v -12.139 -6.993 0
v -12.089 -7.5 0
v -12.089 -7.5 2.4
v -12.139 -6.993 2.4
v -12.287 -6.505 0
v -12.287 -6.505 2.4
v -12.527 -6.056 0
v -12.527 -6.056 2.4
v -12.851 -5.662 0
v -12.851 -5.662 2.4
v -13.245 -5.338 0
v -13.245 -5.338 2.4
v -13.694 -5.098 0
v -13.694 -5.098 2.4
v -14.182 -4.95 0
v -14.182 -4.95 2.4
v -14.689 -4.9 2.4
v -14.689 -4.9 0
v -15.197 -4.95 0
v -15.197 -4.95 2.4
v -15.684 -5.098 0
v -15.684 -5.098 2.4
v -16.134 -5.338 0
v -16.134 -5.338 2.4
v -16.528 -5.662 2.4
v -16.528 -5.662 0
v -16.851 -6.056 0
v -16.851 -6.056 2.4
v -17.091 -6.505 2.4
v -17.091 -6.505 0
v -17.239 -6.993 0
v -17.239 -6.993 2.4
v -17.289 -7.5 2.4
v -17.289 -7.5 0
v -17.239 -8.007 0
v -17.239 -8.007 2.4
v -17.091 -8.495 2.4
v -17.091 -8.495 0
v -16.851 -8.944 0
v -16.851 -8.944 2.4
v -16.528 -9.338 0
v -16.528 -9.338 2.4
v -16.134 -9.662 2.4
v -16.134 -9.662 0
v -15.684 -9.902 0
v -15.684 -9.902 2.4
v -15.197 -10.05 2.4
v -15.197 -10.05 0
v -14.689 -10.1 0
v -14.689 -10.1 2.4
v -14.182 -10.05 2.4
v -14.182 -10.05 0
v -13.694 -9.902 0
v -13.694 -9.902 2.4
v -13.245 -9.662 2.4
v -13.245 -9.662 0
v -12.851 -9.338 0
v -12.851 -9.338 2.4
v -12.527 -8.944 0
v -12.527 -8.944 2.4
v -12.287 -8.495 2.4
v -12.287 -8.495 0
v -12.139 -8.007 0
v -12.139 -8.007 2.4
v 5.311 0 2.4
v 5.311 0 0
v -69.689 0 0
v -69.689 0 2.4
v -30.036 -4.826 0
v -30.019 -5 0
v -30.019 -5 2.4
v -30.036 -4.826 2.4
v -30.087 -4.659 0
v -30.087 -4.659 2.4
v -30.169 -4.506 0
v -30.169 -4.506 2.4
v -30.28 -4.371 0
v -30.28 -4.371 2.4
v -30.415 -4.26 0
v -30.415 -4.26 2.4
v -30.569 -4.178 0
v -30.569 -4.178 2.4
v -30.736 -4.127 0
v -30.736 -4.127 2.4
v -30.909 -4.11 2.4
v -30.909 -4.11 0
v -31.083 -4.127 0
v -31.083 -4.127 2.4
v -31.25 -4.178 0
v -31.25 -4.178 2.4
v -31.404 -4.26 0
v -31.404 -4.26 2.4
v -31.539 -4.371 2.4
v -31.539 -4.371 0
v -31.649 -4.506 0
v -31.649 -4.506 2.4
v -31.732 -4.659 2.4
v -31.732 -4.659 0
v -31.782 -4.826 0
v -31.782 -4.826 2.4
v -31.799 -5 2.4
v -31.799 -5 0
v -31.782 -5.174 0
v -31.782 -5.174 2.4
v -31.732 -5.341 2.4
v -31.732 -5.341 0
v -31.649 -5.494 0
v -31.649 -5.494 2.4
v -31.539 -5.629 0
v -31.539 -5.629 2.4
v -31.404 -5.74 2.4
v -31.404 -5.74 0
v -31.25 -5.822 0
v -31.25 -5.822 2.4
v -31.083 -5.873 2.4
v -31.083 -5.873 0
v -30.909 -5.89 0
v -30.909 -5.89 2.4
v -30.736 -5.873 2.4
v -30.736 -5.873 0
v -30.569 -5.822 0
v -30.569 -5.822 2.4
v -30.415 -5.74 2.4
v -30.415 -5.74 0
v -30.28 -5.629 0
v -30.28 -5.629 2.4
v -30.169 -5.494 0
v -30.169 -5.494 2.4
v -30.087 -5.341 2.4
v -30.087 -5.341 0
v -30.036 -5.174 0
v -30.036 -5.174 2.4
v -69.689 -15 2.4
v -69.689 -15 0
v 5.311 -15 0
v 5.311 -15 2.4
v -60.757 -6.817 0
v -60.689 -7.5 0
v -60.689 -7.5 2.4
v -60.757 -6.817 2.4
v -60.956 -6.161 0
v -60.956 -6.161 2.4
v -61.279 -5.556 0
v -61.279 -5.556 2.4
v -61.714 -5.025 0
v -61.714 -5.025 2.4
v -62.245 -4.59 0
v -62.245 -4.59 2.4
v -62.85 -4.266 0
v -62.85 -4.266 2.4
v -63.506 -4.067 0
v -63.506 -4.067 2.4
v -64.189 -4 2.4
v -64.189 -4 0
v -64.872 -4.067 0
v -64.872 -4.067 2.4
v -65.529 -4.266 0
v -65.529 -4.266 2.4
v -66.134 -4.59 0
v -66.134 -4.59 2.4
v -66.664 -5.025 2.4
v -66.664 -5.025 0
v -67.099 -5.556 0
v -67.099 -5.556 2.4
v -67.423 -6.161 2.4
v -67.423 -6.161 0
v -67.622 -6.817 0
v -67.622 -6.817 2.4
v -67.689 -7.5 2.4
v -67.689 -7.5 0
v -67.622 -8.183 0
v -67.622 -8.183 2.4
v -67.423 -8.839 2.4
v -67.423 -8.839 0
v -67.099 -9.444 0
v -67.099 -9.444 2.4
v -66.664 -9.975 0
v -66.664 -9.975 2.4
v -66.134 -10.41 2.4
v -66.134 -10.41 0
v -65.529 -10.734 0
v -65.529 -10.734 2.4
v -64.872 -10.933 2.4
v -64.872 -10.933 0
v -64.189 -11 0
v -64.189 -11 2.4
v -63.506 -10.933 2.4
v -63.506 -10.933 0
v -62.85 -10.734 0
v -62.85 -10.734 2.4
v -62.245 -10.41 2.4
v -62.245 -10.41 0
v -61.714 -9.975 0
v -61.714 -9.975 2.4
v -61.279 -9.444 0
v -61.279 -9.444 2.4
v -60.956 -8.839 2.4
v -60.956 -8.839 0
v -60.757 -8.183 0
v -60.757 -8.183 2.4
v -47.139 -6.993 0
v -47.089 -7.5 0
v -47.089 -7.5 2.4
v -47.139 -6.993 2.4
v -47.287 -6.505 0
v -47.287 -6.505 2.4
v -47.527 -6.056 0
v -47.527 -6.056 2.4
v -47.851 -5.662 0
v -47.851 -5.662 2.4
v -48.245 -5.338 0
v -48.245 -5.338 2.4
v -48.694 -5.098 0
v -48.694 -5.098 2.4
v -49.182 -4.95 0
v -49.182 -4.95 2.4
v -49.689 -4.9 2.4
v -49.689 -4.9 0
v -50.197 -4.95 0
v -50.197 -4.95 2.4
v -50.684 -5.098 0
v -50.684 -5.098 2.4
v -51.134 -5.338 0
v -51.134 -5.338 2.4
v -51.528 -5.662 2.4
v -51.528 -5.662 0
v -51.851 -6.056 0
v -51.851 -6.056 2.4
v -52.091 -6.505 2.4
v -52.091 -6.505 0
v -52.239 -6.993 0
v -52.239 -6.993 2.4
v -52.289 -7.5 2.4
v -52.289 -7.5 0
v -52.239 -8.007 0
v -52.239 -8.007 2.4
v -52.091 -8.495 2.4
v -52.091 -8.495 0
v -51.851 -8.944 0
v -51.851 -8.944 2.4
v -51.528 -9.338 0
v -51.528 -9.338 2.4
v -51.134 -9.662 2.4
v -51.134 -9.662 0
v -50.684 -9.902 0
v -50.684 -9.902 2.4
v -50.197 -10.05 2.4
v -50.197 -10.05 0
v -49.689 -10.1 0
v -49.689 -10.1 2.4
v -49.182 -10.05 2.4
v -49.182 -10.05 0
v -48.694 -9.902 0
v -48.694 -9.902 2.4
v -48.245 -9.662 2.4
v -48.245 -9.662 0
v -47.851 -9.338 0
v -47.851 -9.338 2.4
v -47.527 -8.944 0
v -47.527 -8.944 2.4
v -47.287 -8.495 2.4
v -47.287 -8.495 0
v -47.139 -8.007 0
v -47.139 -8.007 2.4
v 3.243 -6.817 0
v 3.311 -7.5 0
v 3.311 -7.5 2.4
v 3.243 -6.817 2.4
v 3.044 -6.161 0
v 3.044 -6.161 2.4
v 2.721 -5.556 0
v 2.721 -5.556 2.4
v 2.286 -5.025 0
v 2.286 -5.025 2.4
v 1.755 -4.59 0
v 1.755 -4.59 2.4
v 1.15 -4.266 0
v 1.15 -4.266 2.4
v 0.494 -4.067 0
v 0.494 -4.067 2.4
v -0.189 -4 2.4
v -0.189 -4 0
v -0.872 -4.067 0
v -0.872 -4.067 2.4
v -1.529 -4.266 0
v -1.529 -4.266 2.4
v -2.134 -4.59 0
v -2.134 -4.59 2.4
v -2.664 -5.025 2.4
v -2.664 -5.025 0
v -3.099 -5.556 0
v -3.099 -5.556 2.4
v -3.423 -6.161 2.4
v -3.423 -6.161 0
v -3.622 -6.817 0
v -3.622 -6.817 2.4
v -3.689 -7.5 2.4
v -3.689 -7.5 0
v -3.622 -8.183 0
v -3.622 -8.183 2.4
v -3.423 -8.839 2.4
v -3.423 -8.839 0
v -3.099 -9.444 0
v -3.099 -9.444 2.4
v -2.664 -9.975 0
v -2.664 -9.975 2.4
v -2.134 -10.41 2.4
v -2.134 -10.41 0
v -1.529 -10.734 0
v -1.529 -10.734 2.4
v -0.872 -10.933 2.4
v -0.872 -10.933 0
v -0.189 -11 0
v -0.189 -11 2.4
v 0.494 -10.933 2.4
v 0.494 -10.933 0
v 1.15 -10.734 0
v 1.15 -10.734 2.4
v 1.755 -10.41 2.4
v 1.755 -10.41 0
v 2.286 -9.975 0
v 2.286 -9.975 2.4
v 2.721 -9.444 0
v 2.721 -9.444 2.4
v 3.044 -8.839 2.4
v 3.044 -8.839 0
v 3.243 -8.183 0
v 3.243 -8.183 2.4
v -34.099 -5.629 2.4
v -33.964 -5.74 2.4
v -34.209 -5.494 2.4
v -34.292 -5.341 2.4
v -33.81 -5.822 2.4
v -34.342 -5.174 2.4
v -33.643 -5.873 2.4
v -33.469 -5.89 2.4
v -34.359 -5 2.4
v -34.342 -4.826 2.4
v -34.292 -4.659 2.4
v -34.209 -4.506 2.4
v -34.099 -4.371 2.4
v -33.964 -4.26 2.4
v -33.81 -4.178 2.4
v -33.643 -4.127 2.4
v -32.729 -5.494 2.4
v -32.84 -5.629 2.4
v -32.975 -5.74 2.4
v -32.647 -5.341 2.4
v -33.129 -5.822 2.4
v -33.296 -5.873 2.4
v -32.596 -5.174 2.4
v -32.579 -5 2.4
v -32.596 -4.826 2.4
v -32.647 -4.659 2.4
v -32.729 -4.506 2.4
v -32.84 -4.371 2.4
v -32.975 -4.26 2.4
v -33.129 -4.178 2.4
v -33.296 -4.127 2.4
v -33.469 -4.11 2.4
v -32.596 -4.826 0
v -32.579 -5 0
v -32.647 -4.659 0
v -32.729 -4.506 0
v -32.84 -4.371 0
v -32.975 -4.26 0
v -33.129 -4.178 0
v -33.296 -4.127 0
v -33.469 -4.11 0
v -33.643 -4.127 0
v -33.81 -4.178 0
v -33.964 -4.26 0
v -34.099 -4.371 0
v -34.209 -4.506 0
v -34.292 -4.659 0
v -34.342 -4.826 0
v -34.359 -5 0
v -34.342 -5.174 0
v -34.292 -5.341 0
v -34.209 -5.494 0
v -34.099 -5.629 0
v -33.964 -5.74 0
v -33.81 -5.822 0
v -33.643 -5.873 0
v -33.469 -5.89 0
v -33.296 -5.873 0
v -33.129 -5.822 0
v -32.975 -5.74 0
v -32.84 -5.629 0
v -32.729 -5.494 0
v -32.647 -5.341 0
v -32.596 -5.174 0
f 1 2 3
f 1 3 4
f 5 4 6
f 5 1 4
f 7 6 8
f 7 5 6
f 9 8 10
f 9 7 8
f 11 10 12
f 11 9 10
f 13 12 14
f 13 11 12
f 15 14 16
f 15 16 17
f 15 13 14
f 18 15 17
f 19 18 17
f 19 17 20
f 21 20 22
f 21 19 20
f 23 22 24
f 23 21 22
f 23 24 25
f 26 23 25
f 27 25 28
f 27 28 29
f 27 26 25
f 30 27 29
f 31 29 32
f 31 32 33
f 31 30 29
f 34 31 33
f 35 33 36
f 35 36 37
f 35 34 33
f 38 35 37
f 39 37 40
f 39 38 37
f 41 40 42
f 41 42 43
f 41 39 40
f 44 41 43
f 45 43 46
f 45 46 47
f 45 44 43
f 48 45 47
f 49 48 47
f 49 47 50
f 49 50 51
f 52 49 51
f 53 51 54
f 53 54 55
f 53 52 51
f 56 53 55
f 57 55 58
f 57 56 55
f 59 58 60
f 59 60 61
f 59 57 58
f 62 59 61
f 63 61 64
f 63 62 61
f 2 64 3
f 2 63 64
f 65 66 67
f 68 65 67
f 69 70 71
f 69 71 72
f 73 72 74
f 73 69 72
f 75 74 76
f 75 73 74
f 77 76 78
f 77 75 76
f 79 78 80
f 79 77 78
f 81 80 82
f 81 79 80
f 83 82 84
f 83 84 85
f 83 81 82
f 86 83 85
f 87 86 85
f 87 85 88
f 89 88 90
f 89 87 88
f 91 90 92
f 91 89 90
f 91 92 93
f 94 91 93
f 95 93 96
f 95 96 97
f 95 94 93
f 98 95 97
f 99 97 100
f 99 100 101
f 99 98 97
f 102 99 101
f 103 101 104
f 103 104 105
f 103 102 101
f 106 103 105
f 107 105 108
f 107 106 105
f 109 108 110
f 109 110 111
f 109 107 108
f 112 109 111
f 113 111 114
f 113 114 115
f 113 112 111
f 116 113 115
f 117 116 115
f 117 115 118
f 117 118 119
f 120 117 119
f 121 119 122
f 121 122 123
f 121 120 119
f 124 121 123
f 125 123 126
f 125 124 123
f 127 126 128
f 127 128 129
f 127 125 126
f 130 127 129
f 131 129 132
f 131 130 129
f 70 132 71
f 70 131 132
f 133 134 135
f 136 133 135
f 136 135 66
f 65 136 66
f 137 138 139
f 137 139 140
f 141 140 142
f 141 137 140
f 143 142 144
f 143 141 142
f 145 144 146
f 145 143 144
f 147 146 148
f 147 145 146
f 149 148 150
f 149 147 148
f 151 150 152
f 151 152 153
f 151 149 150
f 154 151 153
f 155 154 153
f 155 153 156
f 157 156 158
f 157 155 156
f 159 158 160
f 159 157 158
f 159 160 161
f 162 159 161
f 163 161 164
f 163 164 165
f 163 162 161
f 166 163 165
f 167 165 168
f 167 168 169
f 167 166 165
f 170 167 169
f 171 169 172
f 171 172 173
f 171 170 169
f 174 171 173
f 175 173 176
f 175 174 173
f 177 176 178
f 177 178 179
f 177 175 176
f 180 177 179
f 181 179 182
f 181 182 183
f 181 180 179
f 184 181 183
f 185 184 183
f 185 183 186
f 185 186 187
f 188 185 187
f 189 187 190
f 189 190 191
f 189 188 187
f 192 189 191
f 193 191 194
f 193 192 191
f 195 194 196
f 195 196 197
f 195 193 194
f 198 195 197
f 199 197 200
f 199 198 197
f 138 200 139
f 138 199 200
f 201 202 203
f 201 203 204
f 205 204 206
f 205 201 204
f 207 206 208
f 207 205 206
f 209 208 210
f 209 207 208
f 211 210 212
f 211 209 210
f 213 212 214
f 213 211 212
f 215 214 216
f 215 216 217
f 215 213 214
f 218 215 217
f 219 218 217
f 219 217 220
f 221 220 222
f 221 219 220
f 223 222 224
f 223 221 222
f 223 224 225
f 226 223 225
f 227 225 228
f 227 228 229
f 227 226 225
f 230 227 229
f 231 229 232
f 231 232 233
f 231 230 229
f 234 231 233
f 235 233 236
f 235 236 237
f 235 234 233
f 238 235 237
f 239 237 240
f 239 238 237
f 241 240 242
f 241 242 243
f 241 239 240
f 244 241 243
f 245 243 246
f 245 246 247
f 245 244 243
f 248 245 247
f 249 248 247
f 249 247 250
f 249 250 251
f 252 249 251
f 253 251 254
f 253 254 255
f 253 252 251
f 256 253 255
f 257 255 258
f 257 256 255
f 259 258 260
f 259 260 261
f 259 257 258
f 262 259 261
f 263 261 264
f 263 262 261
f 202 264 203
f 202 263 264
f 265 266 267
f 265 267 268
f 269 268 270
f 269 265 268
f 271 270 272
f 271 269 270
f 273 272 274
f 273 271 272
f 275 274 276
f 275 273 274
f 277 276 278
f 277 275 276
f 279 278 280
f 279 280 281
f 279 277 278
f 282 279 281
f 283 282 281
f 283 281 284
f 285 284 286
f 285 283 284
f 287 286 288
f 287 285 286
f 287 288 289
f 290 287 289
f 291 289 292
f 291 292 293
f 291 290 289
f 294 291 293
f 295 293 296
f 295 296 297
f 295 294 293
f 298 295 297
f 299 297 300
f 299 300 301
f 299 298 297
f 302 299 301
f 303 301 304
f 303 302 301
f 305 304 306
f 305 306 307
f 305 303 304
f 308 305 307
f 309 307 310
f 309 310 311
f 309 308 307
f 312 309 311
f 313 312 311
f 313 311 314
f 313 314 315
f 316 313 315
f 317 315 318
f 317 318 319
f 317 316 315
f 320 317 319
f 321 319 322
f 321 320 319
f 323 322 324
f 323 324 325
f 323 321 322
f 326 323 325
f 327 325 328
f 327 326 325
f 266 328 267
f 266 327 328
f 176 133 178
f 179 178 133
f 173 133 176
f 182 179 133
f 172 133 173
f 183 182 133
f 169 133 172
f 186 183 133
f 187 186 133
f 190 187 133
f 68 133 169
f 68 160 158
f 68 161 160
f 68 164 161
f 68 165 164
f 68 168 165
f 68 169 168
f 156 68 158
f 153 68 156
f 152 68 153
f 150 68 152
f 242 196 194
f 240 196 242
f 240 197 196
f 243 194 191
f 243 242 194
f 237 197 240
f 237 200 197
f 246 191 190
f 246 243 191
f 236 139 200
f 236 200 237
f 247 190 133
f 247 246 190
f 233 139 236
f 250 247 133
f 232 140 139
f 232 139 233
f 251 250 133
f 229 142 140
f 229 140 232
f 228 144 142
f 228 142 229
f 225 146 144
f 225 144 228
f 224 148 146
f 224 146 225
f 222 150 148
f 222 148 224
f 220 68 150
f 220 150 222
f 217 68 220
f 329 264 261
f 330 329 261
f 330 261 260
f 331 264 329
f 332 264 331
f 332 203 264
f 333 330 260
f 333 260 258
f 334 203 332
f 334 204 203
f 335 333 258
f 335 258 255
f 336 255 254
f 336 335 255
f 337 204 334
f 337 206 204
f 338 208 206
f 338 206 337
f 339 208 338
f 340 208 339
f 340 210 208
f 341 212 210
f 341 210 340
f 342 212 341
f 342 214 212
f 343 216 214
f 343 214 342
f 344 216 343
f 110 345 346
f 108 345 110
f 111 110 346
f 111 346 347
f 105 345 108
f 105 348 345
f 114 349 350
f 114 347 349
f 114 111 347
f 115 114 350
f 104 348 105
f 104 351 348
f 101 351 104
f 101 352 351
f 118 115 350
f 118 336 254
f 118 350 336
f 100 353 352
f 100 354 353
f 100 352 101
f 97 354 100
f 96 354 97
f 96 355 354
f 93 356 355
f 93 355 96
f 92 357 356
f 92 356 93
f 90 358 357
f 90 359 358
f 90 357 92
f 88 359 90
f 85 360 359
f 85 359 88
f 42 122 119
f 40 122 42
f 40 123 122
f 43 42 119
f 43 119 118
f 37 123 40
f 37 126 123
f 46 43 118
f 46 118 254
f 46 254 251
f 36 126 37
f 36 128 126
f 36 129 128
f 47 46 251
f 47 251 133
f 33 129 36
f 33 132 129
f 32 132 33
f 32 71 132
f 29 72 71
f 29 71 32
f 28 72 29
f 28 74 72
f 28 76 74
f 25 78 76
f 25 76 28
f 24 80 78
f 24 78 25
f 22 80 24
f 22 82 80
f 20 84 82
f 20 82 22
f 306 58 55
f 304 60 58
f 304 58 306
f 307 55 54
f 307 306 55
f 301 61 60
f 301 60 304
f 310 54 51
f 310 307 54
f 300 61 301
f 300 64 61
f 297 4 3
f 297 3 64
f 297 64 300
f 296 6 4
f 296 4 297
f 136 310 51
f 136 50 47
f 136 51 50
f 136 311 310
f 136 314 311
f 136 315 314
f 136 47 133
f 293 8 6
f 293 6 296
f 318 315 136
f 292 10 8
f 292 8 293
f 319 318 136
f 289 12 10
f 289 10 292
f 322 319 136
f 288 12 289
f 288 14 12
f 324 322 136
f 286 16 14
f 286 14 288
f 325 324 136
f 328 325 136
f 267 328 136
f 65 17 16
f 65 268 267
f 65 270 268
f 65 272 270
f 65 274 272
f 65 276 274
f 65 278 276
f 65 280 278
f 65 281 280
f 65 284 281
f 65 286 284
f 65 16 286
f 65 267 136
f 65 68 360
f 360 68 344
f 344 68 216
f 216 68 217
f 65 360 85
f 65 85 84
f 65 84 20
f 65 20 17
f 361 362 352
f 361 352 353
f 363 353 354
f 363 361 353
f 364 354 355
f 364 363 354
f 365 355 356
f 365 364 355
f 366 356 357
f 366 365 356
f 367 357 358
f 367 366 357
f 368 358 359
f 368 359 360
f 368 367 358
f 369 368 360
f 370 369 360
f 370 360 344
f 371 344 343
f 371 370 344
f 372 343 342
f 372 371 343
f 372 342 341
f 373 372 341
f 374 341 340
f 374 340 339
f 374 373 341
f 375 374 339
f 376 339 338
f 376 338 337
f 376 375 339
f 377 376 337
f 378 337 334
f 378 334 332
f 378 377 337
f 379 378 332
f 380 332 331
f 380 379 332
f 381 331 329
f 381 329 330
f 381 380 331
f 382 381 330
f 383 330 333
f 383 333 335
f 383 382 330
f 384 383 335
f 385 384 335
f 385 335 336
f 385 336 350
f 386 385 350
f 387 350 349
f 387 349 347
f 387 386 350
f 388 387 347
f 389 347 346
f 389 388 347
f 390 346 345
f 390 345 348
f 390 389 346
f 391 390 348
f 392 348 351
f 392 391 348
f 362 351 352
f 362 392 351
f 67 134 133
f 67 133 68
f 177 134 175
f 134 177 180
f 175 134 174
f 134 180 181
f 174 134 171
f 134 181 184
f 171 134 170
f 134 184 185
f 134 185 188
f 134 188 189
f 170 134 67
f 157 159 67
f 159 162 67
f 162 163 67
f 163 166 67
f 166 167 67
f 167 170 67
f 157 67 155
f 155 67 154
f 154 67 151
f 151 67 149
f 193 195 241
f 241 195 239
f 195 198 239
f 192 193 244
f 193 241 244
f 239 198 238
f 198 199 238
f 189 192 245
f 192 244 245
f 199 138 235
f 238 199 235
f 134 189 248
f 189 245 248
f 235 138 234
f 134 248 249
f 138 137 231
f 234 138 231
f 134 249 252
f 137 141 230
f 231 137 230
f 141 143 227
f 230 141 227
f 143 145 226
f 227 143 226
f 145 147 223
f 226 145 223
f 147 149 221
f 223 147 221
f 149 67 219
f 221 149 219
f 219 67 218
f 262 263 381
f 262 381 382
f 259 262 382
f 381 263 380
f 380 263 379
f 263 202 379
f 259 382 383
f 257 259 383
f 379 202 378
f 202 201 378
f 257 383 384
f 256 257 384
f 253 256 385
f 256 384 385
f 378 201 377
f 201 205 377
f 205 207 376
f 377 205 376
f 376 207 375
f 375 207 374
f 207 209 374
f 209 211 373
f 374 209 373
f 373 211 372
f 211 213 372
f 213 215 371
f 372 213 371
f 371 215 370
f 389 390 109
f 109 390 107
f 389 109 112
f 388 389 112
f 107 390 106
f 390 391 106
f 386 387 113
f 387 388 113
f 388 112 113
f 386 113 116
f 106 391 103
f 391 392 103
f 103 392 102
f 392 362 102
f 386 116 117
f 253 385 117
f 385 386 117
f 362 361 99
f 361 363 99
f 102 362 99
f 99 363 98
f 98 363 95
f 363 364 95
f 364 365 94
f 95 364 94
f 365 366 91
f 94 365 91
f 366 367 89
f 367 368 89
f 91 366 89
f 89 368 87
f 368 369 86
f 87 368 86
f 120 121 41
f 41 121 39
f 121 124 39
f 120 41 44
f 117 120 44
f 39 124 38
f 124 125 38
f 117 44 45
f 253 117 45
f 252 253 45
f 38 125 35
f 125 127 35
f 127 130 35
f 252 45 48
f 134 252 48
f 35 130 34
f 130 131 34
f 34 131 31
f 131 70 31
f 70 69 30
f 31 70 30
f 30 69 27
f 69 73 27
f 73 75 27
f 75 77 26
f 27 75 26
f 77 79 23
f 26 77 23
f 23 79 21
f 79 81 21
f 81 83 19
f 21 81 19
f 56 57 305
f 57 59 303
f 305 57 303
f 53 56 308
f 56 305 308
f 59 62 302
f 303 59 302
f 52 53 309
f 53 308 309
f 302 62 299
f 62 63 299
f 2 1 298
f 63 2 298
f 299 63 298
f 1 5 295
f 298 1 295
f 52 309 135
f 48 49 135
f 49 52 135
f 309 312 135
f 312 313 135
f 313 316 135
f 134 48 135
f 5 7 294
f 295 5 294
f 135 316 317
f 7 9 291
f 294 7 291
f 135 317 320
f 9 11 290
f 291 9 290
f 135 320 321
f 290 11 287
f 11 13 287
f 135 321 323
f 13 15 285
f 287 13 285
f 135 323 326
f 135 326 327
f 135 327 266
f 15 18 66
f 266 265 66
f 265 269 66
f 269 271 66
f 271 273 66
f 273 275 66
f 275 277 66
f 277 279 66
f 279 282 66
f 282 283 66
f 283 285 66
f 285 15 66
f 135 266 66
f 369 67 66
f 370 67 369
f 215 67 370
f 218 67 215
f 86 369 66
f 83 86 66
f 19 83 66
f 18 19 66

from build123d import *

# Parameters (mm, degrees)
F0_W     = 37.5
F0_H     = 15
F0_R     = 3.5
F0_R_2   = 2.6
F0_R_3   = 0.89
F1_DEPTH = 2.4


with BuildPart() as f1:
    # F0 (on Top) → F1 (new body)
    with BuildSketch(Plane.XY):
        with Locations((-50.939284, -7.5)):
            Rectangle(F0_W, F0_H)
        with Locations((-64.189284, -7.5)):
            Circle(F0_R, mode=Mode.SUBTRACT)
        with Locations((-49.689284, -7.5)):
            Circle(F0_R_2, mode=Mode.SUBTRACT)
        with Locations((-33.469284, -5)):
            Circle(F0_R_3, mode=Mode.SUBTRACT)
        with Locations((-13.439284, -7.5)):
            Rectangle(F0_W, F0_H)
        with Locations((-14.689284, -7.5)):
            Circle(F0_R_2, mode=Mode.SUBTRACT)
        with Locations((-30.909284, -5)):
            Circle(F0_R_3, mode=Mode.SUBTRACT)
        with Locations((-0.189284, -7.5)):
            Circle(F0_R, mode=Mode.SUBTRACT)
    extrude(amount=F1_DEPTH)


solid = f1.part
